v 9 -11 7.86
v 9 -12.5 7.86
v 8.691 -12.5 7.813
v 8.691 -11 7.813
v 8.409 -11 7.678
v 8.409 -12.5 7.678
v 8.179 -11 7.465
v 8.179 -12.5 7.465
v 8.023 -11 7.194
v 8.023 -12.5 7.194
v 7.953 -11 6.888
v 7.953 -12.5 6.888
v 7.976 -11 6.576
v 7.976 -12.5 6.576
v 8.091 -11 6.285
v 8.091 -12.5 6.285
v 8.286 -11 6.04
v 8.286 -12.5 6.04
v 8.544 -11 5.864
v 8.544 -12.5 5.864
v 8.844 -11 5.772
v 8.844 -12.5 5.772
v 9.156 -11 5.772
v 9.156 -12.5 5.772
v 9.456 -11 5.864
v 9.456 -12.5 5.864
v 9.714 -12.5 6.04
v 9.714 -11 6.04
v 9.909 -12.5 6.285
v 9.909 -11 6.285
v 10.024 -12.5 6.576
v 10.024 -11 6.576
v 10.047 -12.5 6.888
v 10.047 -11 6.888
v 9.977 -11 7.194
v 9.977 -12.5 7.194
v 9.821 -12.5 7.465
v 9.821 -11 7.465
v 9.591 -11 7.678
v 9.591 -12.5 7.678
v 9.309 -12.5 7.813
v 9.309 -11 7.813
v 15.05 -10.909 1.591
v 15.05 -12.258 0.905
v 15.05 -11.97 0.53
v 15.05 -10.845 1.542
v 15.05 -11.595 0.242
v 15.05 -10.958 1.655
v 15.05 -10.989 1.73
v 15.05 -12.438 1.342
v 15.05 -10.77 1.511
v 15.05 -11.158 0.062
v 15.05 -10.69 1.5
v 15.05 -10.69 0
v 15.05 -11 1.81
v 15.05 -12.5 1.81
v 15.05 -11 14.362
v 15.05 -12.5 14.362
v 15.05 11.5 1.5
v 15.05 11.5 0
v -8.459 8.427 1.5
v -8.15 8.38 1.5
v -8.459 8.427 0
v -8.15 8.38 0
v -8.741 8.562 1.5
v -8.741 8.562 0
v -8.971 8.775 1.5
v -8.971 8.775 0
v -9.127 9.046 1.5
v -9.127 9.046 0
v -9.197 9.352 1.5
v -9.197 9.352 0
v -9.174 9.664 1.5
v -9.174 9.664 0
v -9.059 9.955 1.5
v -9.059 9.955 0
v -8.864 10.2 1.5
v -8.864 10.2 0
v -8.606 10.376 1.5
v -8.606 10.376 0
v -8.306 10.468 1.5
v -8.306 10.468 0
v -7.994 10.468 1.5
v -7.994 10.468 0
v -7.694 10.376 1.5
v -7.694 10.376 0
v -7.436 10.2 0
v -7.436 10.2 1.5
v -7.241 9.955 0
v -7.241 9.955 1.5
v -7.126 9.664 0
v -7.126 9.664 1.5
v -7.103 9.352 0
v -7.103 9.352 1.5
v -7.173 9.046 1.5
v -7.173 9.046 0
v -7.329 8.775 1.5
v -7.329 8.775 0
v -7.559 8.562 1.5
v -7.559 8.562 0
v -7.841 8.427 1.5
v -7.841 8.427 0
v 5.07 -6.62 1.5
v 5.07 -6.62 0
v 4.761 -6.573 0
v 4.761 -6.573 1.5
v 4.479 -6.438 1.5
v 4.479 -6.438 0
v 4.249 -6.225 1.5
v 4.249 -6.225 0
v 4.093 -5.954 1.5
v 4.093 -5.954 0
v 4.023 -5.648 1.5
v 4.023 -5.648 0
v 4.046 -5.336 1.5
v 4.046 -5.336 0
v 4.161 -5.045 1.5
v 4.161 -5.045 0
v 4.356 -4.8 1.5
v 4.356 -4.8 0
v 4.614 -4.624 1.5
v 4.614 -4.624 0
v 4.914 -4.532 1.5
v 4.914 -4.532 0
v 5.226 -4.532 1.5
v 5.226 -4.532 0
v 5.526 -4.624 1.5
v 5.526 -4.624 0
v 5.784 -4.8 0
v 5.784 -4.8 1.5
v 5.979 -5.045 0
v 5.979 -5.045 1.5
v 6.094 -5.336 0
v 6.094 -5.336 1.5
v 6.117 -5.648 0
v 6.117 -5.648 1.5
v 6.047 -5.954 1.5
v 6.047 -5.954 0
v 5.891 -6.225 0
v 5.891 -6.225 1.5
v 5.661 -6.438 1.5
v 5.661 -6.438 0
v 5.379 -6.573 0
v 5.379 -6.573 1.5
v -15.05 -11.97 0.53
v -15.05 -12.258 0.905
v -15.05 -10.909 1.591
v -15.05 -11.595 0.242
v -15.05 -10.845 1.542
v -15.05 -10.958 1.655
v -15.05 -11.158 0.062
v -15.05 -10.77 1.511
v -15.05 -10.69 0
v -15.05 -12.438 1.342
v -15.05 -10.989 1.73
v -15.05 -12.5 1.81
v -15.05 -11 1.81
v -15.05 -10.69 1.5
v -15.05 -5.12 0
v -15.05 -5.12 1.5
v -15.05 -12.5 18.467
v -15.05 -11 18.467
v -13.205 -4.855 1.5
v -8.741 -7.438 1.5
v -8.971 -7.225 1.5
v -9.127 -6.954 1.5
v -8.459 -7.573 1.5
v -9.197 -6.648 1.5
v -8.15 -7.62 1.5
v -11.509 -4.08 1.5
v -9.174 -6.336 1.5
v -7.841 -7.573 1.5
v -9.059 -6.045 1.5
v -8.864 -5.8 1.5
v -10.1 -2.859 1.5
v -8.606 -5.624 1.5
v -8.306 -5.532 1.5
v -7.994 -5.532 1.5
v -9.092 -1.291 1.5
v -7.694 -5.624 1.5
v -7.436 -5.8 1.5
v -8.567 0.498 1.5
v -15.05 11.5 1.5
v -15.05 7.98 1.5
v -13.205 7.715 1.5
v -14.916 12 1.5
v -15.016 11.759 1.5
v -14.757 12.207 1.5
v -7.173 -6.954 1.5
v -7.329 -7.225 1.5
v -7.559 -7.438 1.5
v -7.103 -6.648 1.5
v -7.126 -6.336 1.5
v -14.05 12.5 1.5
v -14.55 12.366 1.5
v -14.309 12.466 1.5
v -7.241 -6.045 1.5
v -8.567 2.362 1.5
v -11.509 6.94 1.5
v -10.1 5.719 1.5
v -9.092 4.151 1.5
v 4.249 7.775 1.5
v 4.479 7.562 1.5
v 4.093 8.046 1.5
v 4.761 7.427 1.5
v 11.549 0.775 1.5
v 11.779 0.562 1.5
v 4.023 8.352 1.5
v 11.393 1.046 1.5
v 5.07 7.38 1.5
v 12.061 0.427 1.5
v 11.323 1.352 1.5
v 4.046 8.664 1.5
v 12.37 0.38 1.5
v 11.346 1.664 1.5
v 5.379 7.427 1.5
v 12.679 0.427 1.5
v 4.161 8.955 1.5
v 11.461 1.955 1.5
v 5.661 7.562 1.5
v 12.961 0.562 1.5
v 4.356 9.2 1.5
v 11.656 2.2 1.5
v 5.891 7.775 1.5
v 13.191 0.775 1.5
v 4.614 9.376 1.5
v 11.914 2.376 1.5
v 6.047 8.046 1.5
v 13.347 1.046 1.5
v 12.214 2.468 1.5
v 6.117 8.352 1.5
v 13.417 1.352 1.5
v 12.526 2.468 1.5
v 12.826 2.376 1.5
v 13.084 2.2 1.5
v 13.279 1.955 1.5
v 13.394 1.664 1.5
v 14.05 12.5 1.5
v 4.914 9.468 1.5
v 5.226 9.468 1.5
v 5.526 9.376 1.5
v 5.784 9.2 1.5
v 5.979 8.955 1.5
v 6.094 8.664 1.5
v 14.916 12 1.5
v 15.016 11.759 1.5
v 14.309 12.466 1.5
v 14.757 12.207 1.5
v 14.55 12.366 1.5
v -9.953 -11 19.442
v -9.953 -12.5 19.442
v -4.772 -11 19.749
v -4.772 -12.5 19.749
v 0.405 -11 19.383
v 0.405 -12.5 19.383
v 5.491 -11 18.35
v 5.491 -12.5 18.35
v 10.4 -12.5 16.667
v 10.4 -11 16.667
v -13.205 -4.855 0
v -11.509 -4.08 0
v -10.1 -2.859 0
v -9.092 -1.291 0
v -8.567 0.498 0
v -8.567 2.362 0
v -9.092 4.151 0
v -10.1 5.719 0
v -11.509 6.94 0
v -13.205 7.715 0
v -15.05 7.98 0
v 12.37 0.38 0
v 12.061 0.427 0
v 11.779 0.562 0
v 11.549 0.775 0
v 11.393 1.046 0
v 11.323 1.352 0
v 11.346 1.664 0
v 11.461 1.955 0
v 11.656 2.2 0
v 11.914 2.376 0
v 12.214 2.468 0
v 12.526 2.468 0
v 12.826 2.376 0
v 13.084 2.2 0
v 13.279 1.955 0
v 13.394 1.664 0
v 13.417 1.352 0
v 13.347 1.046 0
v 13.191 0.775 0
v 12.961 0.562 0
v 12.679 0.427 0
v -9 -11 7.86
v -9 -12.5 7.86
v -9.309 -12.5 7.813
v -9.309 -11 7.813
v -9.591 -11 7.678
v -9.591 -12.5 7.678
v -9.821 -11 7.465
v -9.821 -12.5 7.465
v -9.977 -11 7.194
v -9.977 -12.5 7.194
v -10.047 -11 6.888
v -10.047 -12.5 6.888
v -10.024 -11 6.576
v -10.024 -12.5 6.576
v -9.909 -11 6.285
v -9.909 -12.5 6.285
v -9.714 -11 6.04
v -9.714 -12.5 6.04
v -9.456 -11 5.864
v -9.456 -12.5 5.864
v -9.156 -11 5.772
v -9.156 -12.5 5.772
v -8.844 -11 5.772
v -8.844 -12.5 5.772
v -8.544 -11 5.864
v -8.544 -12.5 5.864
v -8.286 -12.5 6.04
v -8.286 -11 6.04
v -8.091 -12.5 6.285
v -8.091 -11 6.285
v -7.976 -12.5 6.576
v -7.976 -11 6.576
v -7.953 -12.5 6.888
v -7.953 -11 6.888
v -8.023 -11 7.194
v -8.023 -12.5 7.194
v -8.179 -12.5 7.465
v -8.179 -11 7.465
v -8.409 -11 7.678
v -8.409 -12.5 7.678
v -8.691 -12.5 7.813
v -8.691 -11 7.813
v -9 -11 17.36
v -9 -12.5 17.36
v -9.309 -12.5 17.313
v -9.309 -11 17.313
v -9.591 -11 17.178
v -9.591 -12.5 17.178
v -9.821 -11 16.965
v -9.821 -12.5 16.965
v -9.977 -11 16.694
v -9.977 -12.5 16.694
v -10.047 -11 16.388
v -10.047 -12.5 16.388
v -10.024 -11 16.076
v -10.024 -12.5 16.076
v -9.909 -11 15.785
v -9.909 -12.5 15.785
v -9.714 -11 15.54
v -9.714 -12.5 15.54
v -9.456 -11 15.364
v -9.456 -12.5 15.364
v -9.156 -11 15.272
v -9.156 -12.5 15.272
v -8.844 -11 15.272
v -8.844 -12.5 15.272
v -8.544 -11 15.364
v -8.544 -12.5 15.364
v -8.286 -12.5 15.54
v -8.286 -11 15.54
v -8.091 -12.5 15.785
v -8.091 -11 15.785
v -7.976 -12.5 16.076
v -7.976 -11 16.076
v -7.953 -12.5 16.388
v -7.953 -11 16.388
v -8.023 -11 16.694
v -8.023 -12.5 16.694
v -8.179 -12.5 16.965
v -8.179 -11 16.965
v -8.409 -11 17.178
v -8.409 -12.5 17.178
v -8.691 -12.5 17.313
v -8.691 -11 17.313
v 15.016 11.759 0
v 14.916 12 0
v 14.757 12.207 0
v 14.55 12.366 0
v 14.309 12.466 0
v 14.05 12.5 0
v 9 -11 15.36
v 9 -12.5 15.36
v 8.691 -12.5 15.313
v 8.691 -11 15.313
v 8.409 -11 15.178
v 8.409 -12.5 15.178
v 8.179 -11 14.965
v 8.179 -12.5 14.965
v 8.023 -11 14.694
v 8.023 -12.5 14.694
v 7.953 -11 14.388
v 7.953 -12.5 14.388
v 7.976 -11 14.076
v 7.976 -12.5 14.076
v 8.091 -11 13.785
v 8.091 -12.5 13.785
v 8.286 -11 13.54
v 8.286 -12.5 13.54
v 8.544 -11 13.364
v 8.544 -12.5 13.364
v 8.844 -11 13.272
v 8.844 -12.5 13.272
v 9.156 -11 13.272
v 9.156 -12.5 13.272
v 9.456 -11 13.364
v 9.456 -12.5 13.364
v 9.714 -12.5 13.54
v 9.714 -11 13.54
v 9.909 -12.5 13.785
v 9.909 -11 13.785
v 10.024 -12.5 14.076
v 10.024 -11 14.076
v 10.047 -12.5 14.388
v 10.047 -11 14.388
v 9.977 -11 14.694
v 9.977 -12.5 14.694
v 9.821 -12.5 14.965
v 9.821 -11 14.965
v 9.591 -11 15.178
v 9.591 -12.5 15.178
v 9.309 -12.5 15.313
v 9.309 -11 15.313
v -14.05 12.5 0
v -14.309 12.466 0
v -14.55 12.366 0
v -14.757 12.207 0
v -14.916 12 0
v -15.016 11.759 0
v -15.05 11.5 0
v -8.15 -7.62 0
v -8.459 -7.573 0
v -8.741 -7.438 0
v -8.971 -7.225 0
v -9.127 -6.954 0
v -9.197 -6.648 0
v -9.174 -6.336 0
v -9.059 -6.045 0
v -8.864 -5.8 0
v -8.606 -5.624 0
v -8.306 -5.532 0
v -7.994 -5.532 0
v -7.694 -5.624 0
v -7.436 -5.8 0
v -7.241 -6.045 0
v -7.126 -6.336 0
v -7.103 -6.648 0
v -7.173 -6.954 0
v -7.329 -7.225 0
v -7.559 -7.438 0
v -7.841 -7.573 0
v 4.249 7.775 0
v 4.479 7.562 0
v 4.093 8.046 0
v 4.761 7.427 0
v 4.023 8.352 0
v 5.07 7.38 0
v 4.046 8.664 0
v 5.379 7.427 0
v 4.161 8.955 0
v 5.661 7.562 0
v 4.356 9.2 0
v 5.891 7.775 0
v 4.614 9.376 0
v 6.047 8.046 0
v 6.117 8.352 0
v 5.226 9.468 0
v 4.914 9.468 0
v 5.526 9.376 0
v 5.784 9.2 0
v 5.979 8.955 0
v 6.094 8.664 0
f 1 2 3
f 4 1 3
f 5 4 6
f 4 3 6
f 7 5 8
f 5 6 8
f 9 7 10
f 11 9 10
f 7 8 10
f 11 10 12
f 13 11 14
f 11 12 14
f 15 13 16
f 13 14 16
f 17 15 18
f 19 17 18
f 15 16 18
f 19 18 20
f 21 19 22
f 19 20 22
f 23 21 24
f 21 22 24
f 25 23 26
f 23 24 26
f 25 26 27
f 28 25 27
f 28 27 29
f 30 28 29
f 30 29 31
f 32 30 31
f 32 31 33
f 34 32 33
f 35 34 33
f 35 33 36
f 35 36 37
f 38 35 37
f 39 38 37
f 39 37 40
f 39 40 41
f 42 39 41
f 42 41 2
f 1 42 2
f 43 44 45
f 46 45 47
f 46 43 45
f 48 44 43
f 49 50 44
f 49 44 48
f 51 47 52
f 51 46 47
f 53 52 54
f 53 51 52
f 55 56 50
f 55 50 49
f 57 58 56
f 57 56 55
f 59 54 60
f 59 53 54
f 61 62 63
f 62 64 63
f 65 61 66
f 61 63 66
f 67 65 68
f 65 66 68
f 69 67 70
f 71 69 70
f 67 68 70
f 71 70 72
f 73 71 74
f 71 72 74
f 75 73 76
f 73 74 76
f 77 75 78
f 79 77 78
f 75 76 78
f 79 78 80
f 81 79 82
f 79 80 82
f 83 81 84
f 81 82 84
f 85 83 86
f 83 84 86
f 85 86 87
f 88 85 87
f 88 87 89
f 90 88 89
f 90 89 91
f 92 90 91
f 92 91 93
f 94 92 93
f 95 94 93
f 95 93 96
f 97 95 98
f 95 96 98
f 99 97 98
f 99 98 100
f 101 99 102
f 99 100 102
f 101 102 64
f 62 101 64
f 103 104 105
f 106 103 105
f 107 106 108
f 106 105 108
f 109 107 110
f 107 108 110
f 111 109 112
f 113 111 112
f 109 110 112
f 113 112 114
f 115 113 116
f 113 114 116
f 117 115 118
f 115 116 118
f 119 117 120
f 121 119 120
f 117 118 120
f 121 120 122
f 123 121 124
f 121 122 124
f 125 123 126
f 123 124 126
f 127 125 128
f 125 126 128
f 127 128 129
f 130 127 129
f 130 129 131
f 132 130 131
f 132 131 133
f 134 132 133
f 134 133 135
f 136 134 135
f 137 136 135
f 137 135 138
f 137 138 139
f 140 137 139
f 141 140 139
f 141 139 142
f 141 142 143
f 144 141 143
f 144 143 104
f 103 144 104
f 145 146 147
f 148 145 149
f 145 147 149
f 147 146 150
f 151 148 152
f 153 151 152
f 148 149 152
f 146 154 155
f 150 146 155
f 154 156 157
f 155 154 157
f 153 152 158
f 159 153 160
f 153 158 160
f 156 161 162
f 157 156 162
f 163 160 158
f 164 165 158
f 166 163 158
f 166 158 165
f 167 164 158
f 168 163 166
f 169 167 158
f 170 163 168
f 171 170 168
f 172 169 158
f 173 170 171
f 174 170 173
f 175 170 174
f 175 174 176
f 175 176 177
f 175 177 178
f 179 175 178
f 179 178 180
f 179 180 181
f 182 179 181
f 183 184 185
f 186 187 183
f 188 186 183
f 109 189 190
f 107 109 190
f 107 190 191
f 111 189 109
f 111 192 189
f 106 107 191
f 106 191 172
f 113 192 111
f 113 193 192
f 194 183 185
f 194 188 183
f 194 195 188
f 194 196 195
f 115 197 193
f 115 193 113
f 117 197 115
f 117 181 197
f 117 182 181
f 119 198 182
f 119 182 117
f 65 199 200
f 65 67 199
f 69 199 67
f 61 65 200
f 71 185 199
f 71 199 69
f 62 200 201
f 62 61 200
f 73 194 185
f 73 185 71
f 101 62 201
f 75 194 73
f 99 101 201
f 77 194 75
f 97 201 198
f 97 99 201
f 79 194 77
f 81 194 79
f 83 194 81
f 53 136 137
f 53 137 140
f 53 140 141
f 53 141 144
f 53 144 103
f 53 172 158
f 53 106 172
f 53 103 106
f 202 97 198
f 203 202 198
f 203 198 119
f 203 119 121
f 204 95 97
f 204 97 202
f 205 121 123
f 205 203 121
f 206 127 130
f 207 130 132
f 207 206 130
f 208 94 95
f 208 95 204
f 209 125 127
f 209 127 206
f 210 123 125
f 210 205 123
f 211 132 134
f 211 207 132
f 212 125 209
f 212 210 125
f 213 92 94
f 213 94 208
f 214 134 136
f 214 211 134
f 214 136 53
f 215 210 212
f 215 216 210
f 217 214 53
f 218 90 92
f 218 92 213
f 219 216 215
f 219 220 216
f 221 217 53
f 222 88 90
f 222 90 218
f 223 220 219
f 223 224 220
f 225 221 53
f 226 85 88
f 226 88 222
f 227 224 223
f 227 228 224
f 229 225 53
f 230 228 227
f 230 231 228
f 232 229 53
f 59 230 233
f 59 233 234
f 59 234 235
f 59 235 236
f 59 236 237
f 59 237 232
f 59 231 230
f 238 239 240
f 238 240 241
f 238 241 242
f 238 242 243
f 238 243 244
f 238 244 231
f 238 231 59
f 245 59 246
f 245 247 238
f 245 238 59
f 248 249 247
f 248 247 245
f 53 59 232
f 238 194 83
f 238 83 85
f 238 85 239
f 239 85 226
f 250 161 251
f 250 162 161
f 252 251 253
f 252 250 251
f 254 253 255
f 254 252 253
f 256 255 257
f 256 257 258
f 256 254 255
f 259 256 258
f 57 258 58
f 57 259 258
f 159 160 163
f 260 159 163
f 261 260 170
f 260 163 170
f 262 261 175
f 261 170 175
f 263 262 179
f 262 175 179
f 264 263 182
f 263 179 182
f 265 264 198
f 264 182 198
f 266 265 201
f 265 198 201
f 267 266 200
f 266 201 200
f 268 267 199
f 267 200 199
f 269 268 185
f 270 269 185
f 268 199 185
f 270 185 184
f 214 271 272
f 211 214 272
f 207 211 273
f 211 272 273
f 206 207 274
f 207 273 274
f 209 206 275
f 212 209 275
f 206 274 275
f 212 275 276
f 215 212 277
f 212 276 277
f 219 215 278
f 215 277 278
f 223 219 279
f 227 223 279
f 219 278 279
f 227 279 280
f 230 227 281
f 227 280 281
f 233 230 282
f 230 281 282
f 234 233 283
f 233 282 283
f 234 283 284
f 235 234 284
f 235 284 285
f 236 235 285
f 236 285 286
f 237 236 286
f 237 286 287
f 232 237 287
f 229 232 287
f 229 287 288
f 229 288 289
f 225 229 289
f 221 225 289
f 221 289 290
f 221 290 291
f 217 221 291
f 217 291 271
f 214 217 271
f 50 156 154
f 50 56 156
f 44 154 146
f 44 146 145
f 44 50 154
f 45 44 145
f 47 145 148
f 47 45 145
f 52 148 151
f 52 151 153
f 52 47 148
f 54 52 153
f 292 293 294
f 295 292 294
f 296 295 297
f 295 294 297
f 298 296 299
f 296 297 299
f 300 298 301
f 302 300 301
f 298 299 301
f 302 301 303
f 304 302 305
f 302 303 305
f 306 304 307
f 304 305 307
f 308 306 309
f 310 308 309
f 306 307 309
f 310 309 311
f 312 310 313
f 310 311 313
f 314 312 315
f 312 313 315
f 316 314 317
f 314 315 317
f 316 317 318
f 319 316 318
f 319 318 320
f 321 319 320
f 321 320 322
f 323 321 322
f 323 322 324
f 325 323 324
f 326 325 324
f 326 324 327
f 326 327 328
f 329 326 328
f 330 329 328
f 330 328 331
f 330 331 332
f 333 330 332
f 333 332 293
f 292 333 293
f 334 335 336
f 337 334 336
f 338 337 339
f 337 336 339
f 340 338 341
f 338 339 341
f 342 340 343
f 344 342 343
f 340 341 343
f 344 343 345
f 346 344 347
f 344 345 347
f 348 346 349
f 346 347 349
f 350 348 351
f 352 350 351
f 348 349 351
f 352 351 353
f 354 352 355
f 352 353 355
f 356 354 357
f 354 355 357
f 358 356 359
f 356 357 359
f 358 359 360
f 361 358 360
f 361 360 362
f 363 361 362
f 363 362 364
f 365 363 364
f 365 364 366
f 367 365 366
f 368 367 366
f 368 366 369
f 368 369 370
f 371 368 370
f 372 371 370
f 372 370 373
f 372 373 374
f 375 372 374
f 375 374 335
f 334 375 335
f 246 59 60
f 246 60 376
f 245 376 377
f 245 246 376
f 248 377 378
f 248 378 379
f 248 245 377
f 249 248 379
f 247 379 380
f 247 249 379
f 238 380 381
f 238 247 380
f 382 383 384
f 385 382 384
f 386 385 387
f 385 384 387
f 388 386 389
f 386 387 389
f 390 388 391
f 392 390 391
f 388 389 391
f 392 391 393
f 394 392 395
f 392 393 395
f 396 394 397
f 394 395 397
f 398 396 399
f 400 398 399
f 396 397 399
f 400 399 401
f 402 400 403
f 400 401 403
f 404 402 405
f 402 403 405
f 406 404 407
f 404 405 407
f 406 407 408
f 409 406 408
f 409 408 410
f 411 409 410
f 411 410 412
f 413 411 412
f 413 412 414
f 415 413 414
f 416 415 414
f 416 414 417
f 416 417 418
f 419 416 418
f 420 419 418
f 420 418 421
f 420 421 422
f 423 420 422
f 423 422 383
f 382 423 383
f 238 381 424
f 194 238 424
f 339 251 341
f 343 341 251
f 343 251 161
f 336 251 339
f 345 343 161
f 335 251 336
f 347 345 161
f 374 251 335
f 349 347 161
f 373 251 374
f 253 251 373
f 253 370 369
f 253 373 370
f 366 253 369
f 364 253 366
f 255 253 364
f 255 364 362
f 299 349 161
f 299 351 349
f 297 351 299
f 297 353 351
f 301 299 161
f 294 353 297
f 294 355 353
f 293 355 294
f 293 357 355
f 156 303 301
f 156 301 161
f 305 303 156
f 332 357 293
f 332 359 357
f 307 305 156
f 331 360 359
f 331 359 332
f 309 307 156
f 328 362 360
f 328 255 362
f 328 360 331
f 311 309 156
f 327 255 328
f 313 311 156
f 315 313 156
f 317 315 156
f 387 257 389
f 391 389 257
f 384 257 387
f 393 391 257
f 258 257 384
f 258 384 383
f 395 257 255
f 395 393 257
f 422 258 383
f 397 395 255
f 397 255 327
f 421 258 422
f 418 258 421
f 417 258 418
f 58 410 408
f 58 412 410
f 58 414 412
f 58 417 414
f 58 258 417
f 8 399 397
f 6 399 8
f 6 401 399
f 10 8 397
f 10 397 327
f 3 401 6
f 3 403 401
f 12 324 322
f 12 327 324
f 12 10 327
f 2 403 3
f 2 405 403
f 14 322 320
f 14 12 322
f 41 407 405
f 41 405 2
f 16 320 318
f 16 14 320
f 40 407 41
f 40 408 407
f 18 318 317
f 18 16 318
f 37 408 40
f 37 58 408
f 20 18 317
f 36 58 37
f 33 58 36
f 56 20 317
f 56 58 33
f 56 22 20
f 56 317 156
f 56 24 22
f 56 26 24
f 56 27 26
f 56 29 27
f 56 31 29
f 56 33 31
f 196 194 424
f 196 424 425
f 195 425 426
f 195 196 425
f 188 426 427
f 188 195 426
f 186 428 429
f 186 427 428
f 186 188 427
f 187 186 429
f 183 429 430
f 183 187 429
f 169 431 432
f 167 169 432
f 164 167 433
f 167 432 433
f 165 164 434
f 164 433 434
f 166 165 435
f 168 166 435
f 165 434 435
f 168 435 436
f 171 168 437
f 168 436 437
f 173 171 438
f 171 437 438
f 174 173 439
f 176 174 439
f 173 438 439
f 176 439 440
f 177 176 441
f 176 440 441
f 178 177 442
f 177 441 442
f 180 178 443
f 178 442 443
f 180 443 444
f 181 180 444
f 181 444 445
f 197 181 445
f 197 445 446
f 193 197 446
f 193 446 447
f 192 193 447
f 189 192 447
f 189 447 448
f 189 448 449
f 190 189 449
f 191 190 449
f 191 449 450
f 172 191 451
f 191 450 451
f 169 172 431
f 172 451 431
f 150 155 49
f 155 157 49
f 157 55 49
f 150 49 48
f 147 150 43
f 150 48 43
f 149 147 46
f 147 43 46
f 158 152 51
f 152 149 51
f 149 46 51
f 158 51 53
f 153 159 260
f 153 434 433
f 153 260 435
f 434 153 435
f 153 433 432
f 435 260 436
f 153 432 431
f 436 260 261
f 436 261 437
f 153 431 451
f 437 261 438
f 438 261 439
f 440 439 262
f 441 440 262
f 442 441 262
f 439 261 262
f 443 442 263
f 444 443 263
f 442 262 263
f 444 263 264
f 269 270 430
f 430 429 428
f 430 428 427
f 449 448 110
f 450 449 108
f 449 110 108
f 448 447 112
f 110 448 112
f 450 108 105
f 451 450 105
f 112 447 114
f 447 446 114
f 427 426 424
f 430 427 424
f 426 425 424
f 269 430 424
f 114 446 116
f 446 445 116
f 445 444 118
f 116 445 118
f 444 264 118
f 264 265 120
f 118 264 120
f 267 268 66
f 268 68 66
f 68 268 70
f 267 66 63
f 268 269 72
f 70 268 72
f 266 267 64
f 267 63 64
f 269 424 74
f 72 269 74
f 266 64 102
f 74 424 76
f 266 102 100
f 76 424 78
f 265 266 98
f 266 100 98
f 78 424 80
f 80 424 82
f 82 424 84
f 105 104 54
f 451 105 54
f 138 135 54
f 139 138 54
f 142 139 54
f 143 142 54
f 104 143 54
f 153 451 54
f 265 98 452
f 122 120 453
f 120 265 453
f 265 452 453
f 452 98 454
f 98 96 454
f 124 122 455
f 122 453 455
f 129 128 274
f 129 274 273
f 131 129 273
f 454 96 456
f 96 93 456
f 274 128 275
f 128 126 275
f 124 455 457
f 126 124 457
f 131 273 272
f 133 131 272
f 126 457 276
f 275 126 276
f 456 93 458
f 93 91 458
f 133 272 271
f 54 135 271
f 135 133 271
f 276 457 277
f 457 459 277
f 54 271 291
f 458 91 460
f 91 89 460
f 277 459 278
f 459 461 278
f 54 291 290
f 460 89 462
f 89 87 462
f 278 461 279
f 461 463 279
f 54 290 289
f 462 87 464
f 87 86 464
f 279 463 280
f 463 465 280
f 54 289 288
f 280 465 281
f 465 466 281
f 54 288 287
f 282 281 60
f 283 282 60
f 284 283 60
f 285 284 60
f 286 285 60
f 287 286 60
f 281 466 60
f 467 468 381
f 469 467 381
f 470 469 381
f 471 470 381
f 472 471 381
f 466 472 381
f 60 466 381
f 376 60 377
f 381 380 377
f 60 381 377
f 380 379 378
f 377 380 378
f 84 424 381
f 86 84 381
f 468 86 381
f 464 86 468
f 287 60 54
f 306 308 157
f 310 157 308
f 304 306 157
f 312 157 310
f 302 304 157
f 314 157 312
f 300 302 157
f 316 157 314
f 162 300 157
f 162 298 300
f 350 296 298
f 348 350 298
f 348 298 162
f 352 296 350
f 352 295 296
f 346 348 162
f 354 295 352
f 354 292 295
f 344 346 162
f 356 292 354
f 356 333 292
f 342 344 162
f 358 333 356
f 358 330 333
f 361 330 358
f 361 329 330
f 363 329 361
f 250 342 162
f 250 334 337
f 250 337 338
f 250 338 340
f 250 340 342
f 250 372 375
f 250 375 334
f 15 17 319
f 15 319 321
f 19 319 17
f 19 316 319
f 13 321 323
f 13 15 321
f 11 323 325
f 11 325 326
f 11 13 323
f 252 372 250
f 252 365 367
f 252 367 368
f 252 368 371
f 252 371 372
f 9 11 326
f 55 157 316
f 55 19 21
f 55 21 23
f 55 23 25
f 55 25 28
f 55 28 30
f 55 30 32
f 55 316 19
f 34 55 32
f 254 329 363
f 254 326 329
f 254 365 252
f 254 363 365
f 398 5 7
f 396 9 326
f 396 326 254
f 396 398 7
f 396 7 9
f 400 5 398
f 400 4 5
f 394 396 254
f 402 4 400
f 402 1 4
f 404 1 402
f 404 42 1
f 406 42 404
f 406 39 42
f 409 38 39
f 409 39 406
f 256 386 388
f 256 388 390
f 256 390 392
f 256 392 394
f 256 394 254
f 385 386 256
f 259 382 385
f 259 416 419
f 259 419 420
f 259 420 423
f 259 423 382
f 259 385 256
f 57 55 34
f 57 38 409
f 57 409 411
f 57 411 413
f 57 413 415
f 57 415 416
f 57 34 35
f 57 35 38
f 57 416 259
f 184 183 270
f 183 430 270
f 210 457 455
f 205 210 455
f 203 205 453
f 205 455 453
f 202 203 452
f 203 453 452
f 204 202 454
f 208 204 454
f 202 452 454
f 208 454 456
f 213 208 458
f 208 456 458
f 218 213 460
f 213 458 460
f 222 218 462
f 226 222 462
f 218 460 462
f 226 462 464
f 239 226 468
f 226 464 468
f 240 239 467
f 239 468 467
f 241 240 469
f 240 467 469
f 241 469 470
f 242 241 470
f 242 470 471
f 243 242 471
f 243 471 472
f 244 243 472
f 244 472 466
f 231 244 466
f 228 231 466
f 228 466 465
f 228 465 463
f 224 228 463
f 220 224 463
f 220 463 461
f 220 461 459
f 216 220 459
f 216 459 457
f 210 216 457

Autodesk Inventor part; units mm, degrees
ref_plane "YZ Plane" through (0, 0, 0) normal (1, 0, 0) x (0, 1, 0)
ref_plane "XZ Plane" through (0, 0, 0) normal (0, 1, 0) x (-1, 0, 0)
ref_plane "XY Plane" through (0, 0, 0) normal (0, 0, 1) x (1, 0, 0)
sketch "Sketch1" plane through (0, 0, 0) normal (0, 0, 1) x (1, 0, 0)
  line L0 (-15.05, -12.5) -> (15.05, -12.5)
  line L1 (15.05, -12.5) -> (15.05, 12.5)
  line L2 (15.05, 12.5) -> (-15.05, 12.5)
  line L3 (-15.05, 12.5) -> (-15.05, -12.5)
  line L4 (-15.05, -12.5) -> (15.05, 12.5) construction
  line L5 (15.05, -12.5) -> (-15.05, 12.5) construction
  point P0 (0, 0)
  dimension "d0" = 30.1
  dimension "d1" = 25
extrude "Plate1" add sketch "Sketch1" along normal blind 1.5
sketch "Sketch6" plane through (0, 0, 1.5) normal (0, 0, 1) x (1, 0, 0)
  circle A0 centre (-8.15, 9.43) radius 0.7835 projected
  circle A1 centre (-8.15, -6.57) radius 0.7835 projected
  circle A2 centre (5.07, 8.43) radius 0.7835 projected
  circle A3 centre (5.07, -5.57) radius 0.7835 projected
  circle A4 centre (12.37, 1.43) radius 0.7835 projected
  point P0 (0, 0)
hole "Hole2" at (-8.15, 9.43, 1.5) at (5.07, 8.43, 1.5) at (12.37, 1.43, 1.5) at (5.07, -5.57, 1.5) at (-8.15, -6.57, 1.5) direction (0, 0, -1) diameter 2.1 end through all
sketch "Sketch7" plane through (0, 0, 1.5) normal (0, 0, 1) x (1, 0, 0)
  circle A0 centre (-15.05, 1.43) radius 6.4 projected
  circle A1 centre (-15.05, 1.43) radius 6.55
  point P0 (0, 0)
  dimension "d42" = 0.15
extrude "Cut1" cut sketch "Sketch7" against normal blind 1.5 contours A0 | A1
sketch "Sketch8" plane through (15.05, -11, 0) normal (0, -1, 0) x (1, 0, 0)
  line L0 (-30.1, 0) -> (0, 0)
  line L1 (0, 0) -> (0, 20)
  line L2 (0, 20) -> (-30.1, 20)
  line L3 (-30.1, 20) -> (-30.1, 0)
edge flange "Flange2" height 20 angle 90 thickness 1.5 bend radius 0.31 thickness toward (0, -1, 0) relief tear relief width 1.5 relief depth 0.75 edges at (0, -12.5, 1.5) wall of the first edge with corners at (-15.05, -11, 0) (15.05, -11, 0) (15.05, -11, 20) (-15.05, -11, 20)
bend "Bend2"
corner "Corner2"
sketch "Sketch9" plane through (-15.05, -11, 20) normal (0, 1, 0) x (1, 0, 0)
  circle A0 centre (10.05, 40.25) radius 40 projected
  circle A1 centre (10.05, 40.25) radius 50
  point P0 (15.05, 20)
  dimension "d39" = 10
extrude "Cut2" cut sketch "Sketch9" against normal blind 1.5
fillet "Corner Round1" radius 1 2 edges at (15.05, 12.5, 0.75) (-15.05, 12.5, 0.75)
sketch "Sketch10" plane through (-15.05, -11, 1.81) normal (0, 1, 0) x (1, 0, 0)
  line L0 (30.1, 0) -> (0, 0) projected
  arc A0 (0, -16.6569) -> (30.1, -12.5521) centre (10.05, 22.06) ccw projected
  line L1 (15.05, 0) -> (15.05, -17.6263) construction
  point P0 (15.05, 1.81)
  point P1 (6.05, -5)
  point P2 (24.05, -5)
  point P3 (24.05, -12.5)
  point P4 (6.05, -14.5)
  dimension "d44" = 18
  dimension "d45" = 9.5
  dimension "d46" = 7.5
  dimension "d47" = 5
hole "Hole3" at (-9, -11, 6.81) at (9, -11, 6.81) at (9, -11, 14.31) at (-9, -11, 16.31) direction (0, -1, 0) diameter 2.1 end through all
equation "\"d27\" = Thickness"
equation "\"d40\" = Thickness"
equation "\"d2\" = Thickness"
equation "\"d29\" = BendReliefWidth"
equation "\"d30\" = BendReliefDepth"
equation "\"d31\" = MinimumRemnant"
equation "\"d32\" = TransitionRadius"
equation "\"d35\" = BendRadius"
equation "\"d36\" = CornerReliefSize"
equation "\"d37\" = GapSize"
equation "\"d38\" = JacobiRadiusSize"
equation "\"BendReliefWidth\" = Thickness"
equation "\"BendReliefDepth\" = 0.5 * Thickness"
equation "\"CornerReliefSize\" = 4 * Thickness"
equation "\"MinimumRemnant\" = 2 * Thickness"
equation "\"TransitionRadius\" = BendRadius"
equation "\"JacobiRadiusSize\" = BendRadius"
equation "\"GapSize\" = Thickness"
equation "\"Thickness\" = 1.5"
equation "\"BendRadius\" = 0.31"
properties part number "axis_2_bottom_L_frame(top)" material "Aluminum 6061-AHC"
